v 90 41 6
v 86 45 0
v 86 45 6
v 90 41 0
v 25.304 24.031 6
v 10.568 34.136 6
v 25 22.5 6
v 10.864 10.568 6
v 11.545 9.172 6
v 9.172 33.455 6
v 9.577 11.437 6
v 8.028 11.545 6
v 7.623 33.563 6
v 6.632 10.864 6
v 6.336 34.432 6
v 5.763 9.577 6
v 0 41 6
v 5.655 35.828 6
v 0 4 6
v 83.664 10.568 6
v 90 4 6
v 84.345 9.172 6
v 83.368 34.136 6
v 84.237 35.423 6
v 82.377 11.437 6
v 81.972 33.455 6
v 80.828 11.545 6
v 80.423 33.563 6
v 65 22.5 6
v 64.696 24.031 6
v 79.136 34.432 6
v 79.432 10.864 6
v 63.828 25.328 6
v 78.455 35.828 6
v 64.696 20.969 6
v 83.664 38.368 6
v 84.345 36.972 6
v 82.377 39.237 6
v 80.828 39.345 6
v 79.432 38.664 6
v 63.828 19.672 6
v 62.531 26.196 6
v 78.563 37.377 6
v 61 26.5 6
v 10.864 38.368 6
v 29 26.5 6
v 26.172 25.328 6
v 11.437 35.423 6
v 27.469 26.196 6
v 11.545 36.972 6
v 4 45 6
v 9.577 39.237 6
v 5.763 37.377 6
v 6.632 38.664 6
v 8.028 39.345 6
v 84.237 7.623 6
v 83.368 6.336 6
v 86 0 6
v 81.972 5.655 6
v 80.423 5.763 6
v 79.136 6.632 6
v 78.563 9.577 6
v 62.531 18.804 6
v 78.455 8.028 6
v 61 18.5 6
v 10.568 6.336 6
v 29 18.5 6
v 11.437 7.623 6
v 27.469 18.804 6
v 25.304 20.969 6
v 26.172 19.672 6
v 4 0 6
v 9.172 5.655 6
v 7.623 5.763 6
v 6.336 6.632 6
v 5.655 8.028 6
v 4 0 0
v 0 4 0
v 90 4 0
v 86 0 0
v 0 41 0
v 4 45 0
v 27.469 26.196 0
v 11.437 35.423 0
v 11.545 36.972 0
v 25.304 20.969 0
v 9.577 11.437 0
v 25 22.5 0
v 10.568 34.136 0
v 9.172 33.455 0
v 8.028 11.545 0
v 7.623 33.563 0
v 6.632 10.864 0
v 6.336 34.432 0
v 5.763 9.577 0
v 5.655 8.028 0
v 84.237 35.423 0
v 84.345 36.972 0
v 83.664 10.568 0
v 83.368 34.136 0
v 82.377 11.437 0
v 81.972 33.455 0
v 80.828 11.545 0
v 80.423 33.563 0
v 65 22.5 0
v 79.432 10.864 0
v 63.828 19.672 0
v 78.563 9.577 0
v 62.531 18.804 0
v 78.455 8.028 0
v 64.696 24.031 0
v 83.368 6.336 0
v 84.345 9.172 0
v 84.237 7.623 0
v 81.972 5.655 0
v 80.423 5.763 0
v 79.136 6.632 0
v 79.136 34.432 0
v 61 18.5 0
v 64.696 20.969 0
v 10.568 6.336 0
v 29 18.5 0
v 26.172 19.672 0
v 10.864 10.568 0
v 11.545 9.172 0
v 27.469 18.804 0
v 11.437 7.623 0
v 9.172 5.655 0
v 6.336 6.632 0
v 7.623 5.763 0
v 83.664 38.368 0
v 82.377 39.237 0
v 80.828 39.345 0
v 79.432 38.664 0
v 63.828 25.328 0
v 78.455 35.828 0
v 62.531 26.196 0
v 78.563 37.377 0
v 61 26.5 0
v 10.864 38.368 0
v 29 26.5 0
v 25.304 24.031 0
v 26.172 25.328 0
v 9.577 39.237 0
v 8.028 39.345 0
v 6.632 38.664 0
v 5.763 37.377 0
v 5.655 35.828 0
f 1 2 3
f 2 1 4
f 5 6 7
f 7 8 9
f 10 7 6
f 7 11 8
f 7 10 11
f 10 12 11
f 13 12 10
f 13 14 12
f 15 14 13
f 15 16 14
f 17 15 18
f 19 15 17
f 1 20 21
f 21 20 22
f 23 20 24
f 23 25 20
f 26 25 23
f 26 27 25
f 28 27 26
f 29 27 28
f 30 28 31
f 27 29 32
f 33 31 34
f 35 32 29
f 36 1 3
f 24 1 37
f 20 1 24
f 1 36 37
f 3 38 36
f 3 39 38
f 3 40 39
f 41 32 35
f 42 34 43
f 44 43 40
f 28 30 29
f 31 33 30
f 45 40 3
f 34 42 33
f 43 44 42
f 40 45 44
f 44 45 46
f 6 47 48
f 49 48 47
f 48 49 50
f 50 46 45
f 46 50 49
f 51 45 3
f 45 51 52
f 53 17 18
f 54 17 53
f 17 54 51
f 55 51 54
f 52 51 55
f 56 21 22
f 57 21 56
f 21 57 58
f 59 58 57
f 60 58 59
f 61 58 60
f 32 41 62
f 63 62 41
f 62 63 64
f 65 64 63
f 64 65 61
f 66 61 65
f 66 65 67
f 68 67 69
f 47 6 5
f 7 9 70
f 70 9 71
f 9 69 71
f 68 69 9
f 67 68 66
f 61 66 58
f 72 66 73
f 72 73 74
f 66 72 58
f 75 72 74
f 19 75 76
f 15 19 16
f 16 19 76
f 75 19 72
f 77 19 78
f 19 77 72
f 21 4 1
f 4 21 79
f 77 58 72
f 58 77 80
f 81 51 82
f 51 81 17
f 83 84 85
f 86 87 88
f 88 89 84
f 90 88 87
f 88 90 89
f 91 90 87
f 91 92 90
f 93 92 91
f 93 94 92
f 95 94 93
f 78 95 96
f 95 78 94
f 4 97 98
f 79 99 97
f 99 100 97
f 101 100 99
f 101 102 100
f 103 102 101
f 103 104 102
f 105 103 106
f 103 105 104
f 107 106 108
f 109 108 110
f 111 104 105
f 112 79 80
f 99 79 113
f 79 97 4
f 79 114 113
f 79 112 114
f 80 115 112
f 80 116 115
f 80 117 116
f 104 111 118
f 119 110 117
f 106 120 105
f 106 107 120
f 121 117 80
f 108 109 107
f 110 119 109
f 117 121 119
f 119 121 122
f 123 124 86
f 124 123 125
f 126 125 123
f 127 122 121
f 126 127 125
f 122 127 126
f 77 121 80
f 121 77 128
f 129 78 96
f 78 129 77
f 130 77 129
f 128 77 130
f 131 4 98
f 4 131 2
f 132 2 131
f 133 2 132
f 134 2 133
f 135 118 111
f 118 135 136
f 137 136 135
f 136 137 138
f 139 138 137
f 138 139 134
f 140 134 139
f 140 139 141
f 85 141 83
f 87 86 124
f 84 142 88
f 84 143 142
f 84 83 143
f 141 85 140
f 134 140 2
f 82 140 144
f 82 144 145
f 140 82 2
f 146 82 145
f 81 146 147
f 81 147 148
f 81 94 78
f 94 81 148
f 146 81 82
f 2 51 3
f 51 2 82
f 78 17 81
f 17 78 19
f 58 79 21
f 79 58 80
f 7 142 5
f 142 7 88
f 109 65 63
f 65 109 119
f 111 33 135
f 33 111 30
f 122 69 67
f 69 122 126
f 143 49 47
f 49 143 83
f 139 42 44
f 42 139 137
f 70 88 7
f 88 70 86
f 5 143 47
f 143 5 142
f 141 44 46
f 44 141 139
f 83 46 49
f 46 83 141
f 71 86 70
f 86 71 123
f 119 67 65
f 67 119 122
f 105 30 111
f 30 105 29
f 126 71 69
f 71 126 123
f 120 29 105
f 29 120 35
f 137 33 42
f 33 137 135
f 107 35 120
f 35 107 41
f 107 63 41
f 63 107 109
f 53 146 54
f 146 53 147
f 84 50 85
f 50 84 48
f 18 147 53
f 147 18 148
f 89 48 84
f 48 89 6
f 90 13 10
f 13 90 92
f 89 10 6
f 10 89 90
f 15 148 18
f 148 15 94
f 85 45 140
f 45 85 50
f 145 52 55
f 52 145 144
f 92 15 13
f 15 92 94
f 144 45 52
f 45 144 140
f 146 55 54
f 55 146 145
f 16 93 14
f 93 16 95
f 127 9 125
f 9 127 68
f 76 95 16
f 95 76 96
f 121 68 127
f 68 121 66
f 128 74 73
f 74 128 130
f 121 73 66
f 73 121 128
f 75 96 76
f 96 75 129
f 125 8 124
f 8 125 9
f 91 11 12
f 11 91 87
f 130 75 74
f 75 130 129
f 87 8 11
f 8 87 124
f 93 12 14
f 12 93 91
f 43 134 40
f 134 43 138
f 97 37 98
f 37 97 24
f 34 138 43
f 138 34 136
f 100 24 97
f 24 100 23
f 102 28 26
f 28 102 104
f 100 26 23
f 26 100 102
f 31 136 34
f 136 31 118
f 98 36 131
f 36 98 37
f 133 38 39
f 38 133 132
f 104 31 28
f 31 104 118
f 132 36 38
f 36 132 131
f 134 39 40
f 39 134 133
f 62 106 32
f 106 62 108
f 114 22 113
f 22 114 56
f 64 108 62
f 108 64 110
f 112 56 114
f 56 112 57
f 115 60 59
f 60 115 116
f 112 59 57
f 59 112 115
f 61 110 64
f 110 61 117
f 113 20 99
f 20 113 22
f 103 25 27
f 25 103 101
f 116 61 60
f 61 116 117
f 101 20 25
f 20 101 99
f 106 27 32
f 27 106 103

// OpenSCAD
$fn = 32;

// ----------------------------------------------------------------------
// Bracket plate: slot plate 90 x 45
// ----------------------------------------------------------------------

// --- parameters (mm) ---
hole_r = 3;               // bolt hole radius
plate_t = 6;              // plate thickness, Z (extrusion height)
plate_l = 90;             // plate length
plate_w = 45;             // plate width
slot_l = 32;              // slot straight length
slot_r = 4;               // slot end radius

slot_len = slot_l + 2 * slot_r;
slot_w = 2 * slot_r;
hole_d2 = 2 * hole_r;

profile = [[4, 0], [86, 0], [90, 4], [90, 41], [86, 45], [4, 45], [0, 41], [0, 4]];  // primary outline, 8 points, counter clockwise
void_1 = [[61, 18.5], [62.531, 18.804], [63.828, 19.672], [64.696, 20.969], [65, 22.5], [64.696, 24.031], [63.828, 25.328], [62.531, 26.196], [61, 26.5], [29, 26.5], [27.469, 26.196], [26.172, 25.328], [25.304, 24.031], [25, 22.5], [25.304, 20.969], [26.172, 19.672], [27.469, 18.804], [29, 18.5]];  // grip slot, 18 points
void_2 = [[11.545, 36.972], [10.864, 38.368], [9.577, 39.237], [8.028, 39.345], [6.632, 38.664], [5.763, 37.377], [5.655, 35.828], [6.336, 34.432], [7.623, 33.563], [9.172, 33.455], [10.568, 34.136], [11.437, 35.423]];  // corner hole, 12 points
void_3 = [[11.545, 9.172], [10.864, 10.568], [9.577, 11.437], [8.028, 11.545], [6.632, 10.864], [5.763, 9.577], [5.655, 8.028], [6.336, 6.632], [7.623, 5.763], [9.172, 5.655], [10.568, 6.336], [11.437, 7.623]];  // corner hole, 12 points
void_4 = [[84.345, 36.972], [83.664, 38.368], [82.377, 39.237], [80.828, 39.345], [79.432, 38.664], [78.563, 37.377], [78.455, 35.828], [79.136, 34.432], [80.423, 33.563], [81.972, 33.455], [83.368, 34.136], [84.237, 35.423]];  // corner hole, 12 points
void_5 = [[84.345, 9.172], [83.664, 10.568], [82.377, 11.437], [80.828, 11.545], [79.432, 10.864], [78.563, 9.577], [78.455, 8.028], [79.136, 6.632], [80.423, 5.763], [81.972, 5.655], [83.368, 6.336], [84.237, 7.623]];  // corner hole, 12 points

// --- the one profile operation ---
difference() {
  linear_extrude(height = plate_t) polygon(points = profile);
  translate([0, 0, -1])
    linear_extrude(height = plate_t + 2) polygon(points = void_1);
  translate([0, 0, -1])
    linear_extrude(height = plate_t + 2) polygon(points = void_2);
  translate([0, 0, -1])
    linear_extrude(height = plate_t + 2) polygon(points = void_3);
  translate([0, 0, -1])
    linear_extrude(height = plate_t + 2) polygon(points = void_4);
  translate([0, 0, -1])
    linear_extrude(height = plate_t + 2) polygon(points = void_5);
}
